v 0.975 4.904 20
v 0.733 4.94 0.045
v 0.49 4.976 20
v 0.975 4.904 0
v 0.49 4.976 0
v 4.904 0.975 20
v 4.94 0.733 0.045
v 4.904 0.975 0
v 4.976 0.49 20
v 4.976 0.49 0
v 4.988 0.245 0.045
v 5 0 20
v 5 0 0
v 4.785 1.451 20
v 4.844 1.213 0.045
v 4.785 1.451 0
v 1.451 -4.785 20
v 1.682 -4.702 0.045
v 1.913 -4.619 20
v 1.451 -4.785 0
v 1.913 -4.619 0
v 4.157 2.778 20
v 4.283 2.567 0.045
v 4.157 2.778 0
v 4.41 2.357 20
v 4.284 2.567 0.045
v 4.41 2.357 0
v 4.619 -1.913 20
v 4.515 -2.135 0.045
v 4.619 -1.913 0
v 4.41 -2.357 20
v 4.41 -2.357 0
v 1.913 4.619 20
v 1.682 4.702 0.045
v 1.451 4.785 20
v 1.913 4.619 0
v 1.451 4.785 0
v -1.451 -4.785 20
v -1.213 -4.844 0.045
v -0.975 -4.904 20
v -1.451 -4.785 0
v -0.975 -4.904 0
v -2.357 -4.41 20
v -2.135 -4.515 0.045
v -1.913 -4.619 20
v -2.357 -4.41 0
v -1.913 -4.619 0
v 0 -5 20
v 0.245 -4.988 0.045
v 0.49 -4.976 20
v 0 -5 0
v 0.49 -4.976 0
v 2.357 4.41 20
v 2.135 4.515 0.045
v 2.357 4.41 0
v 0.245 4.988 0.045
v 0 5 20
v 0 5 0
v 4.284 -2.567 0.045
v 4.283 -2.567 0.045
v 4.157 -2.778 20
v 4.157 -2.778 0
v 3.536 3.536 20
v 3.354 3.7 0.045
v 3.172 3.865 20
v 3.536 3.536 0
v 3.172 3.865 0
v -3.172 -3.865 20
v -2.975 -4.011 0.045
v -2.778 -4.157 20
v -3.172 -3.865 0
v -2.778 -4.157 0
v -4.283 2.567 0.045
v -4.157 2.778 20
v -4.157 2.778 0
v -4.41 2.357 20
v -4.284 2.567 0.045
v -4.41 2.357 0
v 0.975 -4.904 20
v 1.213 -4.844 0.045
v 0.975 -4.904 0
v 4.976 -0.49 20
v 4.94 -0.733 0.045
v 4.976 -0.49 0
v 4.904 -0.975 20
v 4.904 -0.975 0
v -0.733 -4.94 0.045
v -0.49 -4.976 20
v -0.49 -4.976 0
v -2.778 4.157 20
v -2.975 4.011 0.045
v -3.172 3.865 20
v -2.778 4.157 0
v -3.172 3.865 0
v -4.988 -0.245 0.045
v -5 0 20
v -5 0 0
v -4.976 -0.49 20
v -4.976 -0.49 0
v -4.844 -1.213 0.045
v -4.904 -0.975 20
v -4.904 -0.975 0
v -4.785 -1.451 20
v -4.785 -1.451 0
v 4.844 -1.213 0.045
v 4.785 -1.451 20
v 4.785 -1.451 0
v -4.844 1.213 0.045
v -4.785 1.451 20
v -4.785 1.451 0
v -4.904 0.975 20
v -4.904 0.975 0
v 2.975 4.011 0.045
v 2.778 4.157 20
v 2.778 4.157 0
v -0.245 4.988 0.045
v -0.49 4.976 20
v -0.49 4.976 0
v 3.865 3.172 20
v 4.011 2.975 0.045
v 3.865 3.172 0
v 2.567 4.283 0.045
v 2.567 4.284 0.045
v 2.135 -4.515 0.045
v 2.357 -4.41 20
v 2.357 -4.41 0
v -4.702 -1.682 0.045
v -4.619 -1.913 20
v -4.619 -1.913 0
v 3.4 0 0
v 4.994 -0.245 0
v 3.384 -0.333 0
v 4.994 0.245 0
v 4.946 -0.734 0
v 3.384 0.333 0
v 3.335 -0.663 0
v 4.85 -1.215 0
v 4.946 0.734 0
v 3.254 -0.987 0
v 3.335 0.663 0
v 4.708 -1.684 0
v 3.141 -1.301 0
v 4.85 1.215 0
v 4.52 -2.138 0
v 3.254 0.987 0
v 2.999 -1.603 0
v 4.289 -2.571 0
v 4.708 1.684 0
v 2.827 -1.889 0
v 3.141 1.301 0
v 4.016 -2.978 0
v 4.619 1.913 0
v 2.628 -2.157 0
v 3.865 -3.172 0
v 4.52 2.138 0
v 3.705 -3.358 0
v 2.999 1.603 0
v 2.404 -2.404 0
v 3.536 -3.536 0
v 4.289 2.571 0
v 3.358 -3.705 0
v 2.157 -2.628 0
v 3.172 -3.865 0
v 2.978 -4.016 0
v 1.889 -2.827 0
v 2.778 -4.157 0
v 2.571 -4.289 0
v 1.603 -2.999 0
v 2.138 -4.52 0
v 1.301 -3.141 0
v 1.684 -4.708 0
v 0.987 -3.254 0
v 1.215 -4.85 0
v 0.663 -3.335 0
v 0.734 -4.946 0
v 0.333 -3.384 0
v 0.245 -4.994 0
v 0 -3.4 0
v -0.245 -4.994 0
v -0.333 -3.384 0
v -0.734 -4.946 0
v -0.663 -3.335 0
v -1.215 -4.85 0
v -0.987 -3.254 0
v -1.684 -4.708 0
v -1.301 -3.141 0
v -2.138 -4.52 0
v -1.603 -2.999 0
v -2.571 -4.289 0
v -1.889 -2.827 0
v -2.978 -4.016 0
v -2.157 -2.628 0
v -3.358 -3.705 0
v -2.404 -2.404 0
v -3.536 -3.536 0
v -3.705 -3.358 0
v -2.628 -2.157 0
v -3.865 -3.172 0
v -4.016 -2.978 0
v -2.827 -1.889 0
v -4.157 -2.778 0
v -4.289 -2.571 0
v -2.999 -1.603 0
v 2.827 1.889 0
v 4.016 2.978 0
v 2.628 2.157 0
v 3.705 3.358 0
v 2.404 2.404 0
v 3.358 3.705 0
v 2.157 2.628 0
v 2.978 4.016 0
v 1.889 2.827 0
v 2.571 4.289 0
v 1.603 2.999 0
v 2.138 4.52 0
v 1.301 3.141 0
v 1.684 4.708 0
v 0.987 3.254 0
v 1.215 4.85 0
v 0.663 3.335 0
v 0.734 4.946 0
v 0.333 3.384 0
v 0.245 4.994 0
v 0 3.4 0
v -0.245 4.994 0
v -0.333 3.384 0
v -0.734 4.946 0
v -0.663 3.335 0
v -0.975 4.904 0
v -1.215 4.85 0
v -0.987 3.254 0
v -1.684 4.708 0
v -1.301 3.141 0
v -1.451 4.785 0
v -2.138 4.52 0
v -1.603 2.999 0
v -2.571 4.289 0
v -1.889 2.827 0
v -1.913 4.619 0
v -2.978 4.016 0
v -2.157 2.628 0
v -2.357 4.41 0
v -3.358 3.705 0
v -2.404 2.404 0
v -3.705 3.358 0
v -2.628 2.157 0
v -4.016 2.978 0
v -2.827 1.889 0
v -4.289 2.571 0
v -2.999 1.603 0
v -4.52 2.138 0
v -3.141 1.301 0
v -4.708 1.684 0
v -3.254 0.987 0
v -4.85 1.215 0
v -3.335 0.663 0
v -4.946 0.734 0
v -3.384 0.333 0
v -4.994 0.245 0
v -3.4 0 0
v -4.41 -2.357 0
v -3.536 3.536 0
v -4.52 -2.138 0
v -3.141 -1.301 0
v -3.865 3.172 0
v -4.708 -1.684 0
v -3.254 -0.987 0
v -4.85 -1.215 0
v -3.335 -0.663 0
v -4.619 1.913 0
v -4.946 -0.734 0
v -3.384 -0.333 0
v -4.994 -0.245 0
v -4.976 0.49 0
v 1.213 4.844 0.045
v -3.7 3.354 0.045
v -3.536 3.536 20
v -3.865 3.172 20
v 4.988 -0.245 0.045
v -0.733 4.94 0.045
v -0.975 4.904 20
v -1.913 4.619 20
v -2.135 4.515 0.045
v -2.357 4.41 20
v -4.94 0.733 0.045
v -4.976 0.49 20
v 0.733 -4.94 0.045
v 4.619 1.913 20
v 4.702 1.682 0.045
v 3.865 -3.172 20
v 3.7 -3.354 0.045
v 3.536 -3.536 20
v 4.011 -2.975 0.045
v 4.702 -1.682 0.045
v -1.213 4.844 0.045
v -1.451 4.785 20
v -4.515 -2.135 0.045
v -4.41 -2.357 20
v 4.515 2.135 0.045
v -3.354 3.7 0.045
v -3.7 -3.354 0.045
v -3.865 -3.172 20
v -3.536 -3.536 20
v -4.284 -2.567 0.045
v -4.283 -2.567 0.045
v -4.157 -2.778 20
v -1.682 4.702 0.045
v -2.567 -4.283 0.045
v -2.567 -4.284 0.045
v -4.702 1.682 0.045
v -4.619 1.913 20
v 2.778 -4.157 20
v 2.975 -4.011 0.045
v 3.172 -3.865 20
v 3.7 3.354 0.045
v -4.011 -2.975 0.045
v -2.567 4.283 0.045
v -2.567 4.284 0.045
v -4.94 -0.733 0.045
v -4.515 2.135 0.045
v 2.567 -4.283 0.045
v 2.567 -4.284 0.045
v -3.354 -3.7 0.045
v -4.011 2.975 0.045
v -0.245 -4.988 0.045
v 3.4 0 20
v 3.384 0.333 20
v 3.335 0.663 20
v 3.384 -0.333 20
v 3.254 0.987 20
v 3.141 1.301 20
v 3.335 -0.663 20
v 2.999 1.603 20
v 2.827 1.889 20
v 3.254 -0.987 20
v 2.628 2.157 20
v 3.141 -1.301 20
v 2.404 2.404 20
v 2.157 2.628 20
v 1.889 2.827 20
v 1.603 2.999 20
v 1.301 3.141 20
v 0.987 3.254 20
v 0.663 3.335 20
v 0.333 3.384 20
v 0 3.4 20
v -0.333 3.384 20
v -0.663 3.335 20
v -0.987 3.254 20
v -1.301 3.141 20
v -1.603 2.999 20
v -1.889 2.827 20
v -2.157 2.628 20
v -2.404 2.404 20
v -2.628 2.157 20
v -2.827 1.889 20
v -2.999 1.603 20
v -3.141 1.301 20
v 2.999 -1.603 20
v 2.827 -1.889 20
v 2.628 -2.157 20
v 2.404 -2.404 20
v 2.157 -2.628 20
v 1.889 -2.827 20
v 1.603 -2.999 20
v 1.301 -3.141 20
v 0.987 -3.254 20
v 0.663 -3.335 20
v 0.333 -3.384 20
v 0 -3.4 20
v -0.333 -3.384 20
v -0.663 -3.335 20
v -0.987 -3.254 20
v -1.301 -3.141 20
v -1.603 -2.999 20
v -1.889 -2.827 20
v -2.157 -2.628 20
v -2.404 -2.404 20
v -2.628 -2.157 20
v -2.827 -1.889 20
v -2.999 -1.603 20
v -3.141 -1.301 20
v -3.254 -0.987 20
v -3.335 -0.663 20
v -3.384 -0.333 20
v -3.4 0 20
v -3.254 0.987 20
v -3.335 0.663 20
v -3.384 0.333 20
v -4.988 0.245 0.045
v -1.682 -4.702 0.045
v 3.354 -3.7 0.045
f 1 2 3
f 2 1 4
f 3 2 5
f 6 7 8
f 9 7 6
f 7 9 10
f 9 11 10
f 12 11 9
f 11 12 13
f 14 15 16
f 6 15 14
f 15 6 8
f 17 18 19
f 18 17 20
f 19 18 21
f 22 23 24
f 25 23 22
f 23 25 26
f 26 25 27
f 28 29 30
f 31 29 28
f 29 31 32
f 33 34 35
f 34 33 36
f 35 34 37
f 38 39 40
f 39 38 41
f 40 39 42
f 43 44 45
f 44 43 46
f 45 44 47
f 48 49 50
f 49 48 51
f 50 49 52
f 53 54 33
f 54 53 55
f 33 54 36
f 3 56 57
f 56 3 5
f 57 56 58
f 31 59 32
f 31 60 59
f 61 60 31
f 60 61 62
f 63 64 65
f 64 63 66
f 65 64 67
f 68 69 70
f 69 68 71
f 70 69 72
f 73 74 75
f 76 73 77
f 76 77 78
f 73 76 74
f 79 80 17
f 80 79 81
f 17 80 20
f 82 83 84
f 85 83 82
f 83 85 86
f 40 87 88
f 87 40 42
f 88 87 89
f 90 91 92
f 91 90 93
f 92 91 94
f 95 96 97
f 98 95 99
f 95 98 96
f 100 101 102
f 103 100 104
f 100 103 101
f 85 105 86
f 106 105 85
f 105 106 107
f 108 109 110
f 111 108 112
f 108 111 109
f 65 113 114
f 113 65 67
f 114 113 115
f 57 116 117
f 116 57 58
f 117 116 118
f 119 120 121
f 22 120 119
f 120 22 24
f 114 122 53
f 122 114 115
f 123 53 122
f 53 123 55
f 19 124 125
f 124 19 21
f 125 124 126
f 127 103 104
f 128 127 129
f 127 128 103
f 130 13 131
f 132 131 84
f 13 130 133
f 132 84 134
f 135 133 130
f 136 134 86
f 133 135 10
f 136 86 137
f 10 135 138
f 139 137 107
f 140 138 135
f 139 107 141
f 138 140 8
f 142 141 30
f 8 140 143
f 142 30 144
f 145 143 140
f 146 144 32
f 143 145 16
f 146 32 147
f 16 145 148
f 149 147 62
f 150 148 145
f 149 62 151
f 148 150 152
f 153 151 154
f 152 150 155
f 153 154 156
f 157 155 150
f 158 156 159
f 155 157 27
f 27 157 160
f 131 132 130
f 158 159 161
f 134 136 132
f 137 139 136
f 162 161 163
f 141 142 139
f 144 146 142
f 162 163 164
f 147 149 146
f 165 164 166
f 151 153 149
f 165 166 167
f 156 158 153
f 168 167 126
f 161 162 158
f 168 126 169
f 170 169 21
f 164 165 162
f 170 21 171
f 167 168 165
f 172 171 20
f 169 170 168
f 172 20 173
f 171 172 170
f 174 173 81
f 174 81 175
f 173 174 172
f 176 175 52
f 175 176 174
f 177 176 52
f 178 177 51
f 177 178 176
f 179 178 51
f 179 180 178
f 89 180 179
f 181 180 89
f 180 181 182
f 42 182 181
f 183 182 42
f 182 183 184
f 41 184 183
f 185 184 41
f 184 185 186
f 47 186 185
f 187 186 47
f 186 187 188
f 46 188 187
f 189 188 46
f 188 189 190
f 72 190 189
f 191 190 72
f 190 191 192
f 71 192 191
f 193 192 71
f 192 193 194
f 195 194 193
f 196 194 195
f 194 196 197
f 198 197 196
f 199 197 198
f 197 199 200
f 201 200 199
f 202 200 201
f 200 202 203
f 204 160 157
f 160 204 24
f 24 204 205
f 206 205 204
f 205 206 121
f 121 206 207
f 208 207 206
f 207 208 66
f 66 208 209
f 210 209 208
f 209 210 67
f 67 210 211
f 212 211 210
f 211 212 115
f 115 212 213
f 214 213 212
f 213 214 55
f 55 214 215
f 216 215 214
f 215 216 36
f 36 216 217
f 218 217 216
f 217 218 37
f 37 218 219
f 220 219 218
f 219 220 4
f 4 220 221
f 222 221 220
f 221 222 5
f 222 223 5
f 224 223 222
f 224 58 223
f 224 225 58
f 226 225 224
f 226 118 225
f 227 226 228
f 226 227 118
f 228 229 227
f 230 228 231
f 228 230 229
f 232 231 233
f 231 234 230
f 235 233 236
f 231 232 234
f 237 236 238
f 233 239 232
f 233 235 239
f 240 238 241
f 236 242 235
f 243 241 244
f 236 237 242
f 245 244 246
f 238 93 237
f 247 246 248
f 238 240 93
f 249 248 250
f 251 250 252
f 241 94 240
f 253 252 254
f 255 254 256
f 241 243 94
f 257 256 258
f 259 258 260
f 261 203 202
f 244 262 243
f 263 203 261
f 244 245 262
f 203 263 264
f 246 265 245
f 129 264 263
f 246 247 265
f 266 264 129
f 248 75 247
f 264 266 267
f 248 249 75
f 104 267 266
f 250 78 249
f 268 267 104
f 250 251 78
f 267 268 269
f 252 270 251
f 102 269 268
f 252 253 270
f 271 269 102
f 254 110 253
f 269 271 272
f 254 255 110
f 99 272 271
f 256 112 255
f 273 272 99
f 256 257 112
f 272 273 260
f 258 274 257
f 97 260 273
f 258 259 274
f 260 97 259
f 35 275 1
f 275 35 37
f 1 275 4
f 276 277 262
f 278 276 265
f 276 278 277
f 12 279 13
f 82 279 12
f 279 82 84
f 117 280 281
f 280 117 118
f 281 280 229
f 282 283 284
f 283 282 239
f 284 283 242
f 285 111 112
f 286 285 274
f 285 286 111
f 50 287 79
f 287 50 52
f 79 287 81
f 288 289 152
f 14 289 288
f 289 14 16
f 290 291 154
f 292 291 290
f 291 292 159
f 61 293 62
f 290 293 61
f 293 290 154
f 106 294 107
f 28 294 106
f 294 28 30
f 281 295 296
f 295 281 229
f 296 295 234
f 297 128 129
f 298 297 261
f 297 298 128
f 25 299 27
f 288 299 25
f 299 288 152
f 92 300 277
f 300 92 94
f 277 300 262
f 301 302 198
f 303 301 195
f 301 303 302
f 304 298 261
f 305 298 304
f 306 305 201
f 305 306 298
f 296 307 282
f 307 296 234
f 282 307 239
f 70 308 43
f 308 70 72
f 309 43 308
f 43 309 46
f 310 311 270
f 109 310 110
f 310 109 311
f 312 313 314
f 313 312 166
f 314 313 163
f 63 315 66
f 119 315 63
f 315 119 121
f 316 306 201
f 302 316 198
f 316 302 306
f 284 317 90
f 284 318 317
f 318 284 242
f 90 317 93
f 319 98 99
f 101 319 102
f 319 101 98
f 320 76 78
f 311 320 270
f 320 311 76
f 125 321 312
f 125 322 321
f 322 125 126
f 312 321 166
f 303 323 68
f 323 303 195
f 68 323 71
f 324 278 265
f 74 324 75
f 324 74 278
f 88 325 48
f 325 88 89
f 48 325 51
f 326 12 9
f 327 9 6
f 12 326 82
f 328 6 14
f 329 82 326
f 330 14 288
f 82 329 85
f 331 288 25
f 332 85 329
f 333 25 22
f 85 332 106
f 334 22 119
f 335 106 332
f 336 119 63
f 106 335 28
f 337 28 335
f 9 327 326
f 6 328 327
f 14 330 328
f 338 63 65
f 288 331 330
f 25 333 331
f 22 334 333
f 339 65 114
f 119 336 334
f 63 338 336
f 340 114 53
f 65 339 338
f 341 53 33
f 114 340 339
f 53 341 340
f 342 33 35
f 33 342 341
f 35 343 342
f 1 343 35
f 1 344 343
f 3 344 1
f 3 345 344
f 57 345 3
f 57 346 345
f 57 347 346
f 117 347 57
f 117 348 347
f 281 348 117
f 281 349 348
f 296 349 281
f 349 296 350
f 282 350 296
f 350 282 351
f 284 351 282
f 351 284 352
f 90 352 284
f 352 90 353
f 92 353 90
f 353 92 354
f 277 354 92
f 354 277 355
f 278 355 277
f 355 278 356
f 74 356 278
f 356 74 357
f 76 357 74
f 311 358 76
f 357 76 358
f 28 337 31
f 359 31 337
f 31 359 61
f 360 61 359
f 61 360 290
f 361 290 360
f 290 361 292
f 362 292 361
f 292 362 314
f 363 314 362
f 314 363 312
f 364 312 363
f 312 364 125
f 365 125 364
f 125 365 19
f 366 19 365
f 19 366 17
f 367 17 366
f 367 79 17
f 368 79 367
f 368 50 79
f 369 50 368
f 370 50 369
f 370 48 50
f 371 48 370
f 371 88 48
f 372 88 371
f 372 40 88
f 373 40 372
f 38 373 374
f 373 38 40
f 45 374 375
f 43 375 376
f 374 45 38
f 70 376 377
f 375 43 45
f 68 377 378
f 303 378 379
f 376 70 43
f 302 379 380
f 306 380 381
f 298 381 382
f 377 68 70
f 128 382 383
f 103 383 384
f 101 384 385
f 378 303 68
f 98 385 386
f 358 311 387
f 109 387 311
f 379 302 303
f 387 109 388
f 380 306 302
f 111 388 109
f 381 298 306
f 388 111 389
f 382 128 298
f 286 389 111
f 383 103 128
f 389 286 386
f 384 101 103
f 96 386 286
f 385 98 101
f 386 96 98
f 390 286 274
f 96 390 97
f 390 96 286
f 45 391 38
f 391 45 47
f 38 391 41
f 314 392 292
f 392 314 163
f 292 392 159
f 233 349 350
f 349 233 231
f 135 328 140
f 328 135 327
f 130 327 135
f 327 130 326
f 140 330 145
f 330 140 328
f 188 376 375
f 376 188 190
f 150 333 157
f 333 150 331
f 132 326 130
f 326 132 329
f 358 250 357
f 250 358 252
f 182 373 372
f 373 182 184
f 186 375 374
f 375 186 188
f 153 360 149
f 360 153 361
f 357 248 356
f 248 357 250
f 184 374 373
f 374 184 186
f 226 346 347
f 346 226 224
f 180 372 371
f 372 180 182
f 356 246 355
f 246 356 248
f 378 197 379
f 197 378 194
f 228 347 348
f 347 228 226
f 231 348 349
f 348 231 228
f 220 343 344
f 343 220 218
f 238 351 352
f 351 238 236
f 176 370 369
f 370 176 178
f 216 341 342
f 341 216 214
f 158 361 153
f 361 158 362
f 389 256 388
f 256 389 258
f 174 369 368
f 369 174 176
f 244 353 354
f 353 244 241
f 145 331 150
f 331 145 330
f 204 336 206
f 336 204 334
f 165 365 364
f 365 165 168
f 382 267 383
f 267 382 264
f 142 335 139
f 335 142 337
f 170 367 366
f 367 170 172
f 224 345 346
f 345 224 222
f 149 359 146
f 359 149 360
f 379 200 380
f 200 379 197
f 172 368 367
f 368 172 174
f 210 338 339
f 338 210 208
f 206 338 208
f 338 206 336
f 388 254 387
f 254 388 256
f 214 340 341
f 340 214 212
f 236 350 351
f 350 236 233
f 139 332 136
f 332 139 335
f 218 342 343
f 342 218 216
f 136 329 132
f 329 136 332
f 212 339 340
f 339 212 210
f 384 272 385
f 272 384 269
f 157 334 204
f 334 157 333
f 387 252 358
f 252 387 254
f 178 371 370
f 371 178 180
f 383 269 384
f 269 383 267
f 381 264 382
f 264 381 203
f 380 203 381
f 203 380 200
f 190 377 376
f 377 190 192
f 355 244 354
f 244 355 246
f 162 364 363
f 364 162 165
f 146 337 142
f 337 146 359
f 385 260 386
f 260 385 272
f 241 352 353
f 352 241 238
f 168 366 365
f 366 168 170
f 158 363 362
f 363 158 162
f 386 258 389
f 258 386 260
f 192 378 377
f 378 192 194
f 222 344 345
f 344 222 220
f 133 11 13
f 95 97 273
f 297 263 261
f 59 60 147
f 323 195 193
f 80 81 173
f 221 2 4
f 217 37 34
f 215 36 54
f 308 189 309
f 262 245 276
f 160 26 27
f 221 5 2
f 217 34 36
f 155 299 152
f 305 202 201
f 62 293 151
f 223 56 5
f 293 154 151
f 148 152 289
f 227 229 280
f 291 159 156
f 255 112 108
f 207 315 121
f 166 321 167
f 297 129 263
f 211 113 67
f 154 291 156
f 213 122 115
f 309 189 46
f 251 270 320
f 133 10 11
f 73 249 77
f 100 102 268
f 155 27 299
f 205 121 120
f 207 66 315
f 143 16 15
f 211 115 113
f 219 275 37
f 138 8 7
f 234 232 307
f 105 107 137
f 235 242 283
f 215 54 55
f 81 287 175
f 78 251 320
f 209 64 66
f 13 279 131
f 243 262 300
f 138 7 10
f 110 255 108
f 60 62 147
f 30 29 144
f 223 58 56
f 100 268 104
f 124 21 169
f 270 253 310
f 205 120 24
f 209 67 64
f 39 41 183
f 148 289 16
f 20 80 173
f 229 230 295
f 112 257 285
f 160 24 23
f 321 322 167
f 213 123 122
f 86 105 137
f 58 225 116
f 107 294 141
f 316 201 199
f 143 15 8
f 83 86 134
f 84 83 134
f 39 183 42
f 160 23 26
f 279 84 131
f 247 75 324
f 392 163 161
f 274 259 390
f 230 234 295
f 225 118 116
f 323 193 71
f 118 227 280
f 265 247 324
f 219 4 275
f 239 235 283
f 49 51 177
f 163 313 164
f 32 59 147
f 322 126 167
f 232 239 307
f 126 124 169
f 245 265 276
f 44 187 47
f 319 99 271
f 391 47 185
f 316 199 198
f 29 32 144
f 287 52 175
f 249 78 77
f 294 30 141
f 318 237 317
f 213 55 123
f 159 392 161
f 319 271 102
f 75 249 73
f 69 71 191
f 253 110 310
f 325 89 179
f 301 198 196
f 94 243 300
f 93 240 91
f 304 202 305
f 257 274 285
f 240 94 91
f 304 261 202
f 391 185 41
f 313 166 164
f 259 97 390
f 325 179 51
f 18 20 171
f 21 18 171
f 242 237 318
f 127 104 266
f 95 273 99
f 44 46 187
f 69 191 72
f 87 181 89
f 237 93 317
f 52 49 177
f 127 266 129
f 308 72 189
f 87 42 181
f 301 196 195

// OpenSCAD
// Lab funnel - printed upright, wide opening at the top
// Units: mm. Straight spout (tube) from z = 0 to z = 20,
// then a cone widens to the rim at z = 50. Wall 1.6 mm thick.

$fn = 64;

// ---- Dimensions ----
spout_d        = 10;   // spout outer diameter
spout_bore     = 6.8;  // spout bore (tube) diameter
spout_h        = 20;   // spout height (z = 0 to z = 20)
cone_top_d     = 10;   // cone outer diameter at z = 20 (top of spout)
cone_rim_d     = 60;   // cone outer diameter at the rim (z = 50)
wall           = 1.6;  // wall thickness everywhere
eps            = 0.5;  // cutter overshoot past faces

// ---- Derived ----
cone_rim_h      = 50;                        // rim height (z = 50)
cone_slope      = (cone_rim_d - cone_top_d) / (cone_rim_h - spout_h);  // 1 mm per 1.667 mm Z
cone_bore_d     = spout_bore + 2 * wall;     // bore diameter through the cone (8.4 mm)

// ---- Model ----
union() {
    // Spout: tube 10 mm OD, 6.8 mm bore, z = 0 to z = 20
    difference() {
        cylinder(d = spout_d, h = spout_h);
        translate([0, 0, -eps])
            cylinder(d = spout_bore, h = spout_h + 2 * eps);
    }

    // Cone: OD 10 mm at z = 20, 60 mm at z = 50, same bore through
    difference() {
        cylinder(d1 = cone_top_d, h = cone_rim_h - spout_h, $fn = 128);  // cone body
        translate([0, 0, -eps])
            cylinder(d = cone_bore_d, h = (cone_rim_h - spout_h) + 2 * eps);
    }
}
